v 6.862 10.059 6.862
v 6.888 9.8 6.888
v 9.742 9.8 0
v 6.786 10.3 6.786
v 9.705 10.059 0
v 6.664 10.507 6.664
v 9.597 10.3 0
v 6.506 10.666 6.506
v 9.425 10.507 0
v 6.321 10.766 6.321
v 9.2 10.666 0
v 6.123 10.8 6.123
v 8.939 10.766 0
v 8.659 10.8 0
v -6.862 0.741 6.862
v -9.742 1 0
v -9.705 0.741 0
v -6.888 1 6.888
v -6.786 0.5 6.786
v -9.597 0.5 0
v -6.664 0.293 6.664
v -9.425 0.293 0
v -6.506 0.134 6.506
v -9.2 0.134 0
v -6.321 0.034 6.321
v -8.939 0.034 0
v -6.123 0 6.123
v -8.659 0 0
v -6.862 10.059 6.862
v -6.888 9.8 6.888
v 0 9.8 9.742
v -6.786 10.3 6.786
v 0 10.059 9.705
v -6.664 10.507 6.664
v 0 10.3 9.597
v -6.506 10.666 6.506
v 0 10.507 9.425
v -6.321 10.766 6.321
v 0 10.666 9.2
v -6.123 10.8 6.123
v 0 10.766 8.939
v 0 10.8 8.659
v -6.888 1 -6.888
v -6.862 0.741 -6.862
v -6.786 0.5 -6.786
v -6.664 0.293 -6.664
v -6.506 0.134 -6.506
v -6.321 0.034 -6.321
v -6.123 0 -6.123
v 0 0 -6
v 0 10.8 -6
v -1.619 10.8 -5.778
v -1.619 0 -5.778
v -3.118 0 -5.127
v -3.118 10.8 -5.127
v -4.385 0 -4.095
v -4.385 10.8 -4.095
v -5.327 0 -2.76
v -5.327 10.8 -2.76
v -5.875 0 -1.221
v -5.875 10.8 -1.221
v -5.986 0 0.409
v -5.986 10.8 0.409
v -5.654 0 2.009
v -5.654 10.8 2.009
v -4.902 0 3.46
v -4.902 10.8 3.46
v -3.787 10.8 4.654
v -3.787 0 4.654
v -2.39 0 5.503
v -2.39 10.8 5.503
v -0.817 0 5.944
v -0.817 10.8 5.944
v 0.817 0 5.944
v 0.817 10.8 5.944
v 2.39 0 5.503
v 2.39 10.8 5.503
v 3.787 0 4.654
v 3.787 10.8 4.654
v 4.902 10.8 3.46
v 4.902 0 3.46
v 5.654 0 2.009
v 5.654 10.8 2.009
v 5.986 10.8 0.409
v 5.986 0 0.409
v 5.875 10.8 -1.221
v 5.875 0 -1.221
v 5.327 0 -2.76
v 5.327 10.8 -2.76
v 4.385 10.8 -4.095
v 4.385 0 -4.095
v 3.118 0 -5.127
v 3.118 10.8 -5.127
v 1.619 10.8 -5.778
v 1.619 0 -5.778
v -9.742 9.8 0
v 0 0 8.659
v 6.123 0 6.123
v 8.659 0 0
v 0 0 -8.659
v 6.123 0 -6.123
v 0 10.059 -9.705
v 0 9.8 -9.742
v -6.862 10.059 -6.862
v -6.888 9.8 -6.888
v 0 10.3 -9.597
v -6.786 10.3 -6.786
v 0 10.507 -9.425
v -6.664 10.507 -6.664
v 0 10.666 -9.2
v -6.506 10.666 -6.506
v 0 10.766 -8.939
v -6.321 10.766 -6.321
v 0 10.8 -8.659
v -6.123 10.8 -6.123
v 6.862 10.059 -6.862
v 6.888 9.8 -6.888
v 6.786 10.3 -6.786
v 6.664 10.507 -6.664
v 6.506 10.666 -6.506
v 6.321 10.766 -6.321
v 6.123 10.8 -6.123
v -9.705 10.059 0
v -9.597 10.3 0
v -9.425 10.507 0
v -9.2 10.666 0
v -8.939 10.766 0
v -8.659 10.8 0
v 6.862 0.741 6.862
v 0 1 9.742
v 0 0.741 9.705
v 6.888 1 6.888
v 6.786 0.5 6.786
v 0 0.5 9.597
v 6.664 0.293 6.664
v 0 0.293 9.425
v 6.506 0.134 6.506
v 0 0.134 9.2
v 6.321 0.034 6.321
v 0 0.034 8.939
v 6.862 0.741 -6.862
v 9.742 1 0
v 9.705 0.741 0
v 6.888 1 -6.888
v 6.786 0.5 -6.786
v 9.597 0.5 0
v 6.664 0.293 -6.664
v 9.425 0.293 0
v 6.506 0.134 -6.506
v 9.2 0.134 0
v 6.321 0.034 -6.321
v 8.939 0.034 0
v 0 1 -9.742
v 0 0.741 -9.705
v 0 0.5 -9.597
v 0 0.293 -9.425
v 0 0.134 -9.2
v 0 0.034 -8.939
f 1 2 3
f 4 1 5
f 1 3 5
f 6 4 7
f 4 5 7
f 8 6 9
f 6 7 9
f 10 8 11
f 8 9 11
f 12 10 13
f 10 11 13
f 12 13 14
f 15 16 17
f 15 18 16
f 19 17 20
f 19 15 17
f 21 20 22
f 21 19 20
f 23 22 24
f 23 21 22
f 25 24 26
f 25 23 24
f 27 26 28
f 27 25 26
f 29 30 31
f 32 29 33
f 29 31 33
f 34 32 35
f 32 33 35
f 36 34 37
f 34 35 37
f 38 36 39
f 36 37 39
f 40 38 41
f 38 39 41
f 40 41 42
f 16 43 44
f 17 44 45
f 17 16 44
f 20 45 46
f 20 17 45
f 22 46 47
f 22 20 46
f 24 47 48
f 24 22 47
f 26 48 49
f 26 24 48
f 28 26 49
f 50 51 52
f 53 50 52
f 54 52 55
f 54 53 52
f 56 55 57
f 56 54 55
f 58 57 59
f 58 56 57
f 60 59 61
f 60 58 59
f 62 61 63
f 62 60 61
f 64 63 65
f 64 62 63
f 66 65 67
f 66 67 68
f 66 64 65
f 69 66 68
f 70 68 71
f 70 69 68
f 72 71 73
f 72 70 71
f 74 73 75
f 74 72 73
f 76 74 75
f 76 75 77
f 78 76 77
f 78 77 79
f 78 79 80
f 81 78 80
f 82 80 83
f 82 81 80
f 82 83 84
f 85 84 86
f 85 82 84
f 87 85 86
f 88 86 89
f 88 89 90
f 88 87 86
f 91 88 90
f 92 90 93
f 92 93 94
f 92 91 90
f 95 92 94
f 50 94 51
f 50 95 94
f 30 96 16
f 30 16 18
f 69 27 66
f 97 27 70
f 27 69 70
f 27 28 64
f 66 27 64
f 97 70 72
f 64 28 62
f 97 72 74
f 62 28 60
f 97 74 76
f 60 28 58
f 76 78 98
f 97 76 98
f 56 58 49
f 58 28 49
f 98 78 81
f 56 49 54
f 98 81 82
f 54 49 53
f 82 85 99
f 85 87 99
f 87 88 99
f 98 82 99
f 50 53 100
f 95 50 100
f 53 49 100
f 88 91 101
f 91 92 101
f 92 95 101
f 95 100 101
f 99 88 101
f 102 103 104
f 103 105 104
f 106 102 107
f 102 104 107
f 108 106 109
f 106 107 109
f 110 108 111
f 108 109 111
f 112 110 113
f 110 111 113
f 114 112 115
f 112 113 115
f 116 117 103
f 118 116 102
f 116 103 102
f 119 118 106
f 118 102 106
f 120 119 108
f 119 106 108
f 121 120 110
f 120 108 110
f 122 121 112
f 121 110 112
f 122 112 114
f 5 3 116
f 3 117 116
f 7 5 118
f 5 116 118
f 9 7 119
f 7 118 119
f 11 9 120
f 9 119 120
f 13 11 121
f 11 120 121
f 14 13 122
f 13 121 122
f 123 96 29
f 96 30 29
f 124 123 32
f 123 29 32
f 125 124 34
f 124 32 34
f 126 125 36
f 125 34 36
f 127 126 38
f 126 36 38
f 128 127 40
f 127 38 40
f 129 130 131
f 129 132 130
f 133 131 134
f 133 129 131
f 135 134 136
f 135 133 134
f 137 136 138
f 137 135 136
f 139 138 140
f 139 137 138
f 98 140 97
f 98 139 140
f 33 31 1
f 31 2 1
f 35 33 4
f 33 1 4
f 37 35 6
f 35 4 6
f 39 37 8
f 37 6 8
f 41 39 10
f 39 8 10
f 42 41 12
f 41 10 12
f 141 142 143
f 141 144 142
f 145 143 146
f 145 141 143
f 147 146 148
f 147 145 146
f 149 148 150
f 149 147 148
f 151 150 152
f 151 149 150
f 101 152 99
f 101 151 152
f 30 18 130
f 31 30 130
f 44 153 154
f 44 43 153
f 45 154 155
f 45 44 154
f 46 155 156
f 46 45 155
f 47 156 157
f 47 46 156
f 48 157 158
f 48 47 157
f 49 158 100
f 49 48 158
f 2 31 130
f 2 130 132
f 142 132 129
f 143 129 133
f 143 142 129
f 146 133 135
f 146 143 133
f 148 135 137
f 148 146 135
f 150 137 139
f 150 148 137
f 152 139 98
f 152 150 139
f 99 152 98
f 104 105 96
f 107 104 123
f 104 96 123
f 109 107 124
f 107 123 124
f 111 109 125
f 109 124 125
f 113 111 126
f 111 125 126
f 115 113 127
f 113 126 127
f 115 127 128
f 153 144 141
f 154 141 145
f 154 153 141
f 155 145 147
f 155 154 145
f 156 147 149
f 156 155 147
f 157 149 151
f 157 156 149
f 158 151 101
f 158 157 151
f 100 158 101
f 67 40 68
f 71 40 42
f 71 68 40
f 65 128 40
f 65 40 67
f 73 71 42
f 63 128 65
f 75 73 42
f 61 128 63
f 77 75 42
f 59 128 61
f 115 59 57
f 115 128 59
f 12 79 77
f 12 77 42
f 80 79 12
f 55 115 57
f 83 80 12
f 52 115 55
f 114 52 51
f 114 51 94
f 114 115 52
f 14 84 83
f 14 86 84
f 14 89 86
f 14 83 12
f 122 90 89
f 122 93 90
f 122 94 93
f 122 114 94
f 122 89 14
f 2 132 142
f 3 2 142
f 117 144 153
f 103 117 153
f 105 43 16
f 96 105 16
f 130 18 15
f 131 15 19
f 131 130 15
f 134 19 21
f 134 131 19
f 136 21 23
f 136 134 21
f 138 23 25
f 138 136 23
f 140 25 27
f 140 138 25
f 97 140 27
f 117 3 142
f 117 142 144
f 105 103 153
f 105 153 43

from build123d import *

# Parameters (mm, degrees)
SKETCH1_R           = 6
BOSS_EXTRUDE1_DEPTH = 10.8
FILLET1_R           = 1


with BuildPart() as part:
    # Sketch1 → Boss-Extrude1 (new body)
    with BuildSketch(Plane(origin=(0, 0, 0), x_dir=(1, 0, 0), z_dir=(0, 1, 0))):
        Polygon((9.741529803, 0), (6.888301783, 6.888301783), (0, 9.741529803), (-6.888301783, 6.888301783), (-9.741529803, 0), (-6.888301783, -6.888301783), (0, -9.741529803), (6.888301783, -6.888301783), align=None)
        with Locations(Location((0, 0, 0), (0, 0, 90))):
            Circle(SKETCH1_R, mode=Mode.SUBTRACT)
    extrude(amount=BOSS_EXTRUDE1_DEPTH)

    # Fillet1
    fillet1_edges = [part.edges().sort_by_distance(p)[0] for p in [
        (3.444150891, 10.8, -8.314915793),
        (8.314915793, 0, -3.444150891),
        (8.314915793, 0, 3.444150891),
        (-3.444150891, 10.8, -8.314915793),
        (-8.314915793, 10.8, -3.444150891),
        (-8.314915793, 10.8, 3.444150891),
        (-3.444150891, 10.8, 8.314915793),
        (3.444150891, 10.8, 8.314915793),
        (8.314915793, 10.8, 3.444150891),
        (8.314915793, 10.8, -3.444150891),
        (3.444150891, 0, 8.314915793),
        (-3.444150891, 0, 8.314915793),
        (-8.314915793, 0, 3.444150891),
        (-8.314915793, 0, -3.444150891),
        (-3.444150891, 0, -8.314915793),
        (3.444150891, 0, -8.314915793),
    ]]
    fillet(fillet1_edges, radius=FILLET1_R)


solid = part.part
